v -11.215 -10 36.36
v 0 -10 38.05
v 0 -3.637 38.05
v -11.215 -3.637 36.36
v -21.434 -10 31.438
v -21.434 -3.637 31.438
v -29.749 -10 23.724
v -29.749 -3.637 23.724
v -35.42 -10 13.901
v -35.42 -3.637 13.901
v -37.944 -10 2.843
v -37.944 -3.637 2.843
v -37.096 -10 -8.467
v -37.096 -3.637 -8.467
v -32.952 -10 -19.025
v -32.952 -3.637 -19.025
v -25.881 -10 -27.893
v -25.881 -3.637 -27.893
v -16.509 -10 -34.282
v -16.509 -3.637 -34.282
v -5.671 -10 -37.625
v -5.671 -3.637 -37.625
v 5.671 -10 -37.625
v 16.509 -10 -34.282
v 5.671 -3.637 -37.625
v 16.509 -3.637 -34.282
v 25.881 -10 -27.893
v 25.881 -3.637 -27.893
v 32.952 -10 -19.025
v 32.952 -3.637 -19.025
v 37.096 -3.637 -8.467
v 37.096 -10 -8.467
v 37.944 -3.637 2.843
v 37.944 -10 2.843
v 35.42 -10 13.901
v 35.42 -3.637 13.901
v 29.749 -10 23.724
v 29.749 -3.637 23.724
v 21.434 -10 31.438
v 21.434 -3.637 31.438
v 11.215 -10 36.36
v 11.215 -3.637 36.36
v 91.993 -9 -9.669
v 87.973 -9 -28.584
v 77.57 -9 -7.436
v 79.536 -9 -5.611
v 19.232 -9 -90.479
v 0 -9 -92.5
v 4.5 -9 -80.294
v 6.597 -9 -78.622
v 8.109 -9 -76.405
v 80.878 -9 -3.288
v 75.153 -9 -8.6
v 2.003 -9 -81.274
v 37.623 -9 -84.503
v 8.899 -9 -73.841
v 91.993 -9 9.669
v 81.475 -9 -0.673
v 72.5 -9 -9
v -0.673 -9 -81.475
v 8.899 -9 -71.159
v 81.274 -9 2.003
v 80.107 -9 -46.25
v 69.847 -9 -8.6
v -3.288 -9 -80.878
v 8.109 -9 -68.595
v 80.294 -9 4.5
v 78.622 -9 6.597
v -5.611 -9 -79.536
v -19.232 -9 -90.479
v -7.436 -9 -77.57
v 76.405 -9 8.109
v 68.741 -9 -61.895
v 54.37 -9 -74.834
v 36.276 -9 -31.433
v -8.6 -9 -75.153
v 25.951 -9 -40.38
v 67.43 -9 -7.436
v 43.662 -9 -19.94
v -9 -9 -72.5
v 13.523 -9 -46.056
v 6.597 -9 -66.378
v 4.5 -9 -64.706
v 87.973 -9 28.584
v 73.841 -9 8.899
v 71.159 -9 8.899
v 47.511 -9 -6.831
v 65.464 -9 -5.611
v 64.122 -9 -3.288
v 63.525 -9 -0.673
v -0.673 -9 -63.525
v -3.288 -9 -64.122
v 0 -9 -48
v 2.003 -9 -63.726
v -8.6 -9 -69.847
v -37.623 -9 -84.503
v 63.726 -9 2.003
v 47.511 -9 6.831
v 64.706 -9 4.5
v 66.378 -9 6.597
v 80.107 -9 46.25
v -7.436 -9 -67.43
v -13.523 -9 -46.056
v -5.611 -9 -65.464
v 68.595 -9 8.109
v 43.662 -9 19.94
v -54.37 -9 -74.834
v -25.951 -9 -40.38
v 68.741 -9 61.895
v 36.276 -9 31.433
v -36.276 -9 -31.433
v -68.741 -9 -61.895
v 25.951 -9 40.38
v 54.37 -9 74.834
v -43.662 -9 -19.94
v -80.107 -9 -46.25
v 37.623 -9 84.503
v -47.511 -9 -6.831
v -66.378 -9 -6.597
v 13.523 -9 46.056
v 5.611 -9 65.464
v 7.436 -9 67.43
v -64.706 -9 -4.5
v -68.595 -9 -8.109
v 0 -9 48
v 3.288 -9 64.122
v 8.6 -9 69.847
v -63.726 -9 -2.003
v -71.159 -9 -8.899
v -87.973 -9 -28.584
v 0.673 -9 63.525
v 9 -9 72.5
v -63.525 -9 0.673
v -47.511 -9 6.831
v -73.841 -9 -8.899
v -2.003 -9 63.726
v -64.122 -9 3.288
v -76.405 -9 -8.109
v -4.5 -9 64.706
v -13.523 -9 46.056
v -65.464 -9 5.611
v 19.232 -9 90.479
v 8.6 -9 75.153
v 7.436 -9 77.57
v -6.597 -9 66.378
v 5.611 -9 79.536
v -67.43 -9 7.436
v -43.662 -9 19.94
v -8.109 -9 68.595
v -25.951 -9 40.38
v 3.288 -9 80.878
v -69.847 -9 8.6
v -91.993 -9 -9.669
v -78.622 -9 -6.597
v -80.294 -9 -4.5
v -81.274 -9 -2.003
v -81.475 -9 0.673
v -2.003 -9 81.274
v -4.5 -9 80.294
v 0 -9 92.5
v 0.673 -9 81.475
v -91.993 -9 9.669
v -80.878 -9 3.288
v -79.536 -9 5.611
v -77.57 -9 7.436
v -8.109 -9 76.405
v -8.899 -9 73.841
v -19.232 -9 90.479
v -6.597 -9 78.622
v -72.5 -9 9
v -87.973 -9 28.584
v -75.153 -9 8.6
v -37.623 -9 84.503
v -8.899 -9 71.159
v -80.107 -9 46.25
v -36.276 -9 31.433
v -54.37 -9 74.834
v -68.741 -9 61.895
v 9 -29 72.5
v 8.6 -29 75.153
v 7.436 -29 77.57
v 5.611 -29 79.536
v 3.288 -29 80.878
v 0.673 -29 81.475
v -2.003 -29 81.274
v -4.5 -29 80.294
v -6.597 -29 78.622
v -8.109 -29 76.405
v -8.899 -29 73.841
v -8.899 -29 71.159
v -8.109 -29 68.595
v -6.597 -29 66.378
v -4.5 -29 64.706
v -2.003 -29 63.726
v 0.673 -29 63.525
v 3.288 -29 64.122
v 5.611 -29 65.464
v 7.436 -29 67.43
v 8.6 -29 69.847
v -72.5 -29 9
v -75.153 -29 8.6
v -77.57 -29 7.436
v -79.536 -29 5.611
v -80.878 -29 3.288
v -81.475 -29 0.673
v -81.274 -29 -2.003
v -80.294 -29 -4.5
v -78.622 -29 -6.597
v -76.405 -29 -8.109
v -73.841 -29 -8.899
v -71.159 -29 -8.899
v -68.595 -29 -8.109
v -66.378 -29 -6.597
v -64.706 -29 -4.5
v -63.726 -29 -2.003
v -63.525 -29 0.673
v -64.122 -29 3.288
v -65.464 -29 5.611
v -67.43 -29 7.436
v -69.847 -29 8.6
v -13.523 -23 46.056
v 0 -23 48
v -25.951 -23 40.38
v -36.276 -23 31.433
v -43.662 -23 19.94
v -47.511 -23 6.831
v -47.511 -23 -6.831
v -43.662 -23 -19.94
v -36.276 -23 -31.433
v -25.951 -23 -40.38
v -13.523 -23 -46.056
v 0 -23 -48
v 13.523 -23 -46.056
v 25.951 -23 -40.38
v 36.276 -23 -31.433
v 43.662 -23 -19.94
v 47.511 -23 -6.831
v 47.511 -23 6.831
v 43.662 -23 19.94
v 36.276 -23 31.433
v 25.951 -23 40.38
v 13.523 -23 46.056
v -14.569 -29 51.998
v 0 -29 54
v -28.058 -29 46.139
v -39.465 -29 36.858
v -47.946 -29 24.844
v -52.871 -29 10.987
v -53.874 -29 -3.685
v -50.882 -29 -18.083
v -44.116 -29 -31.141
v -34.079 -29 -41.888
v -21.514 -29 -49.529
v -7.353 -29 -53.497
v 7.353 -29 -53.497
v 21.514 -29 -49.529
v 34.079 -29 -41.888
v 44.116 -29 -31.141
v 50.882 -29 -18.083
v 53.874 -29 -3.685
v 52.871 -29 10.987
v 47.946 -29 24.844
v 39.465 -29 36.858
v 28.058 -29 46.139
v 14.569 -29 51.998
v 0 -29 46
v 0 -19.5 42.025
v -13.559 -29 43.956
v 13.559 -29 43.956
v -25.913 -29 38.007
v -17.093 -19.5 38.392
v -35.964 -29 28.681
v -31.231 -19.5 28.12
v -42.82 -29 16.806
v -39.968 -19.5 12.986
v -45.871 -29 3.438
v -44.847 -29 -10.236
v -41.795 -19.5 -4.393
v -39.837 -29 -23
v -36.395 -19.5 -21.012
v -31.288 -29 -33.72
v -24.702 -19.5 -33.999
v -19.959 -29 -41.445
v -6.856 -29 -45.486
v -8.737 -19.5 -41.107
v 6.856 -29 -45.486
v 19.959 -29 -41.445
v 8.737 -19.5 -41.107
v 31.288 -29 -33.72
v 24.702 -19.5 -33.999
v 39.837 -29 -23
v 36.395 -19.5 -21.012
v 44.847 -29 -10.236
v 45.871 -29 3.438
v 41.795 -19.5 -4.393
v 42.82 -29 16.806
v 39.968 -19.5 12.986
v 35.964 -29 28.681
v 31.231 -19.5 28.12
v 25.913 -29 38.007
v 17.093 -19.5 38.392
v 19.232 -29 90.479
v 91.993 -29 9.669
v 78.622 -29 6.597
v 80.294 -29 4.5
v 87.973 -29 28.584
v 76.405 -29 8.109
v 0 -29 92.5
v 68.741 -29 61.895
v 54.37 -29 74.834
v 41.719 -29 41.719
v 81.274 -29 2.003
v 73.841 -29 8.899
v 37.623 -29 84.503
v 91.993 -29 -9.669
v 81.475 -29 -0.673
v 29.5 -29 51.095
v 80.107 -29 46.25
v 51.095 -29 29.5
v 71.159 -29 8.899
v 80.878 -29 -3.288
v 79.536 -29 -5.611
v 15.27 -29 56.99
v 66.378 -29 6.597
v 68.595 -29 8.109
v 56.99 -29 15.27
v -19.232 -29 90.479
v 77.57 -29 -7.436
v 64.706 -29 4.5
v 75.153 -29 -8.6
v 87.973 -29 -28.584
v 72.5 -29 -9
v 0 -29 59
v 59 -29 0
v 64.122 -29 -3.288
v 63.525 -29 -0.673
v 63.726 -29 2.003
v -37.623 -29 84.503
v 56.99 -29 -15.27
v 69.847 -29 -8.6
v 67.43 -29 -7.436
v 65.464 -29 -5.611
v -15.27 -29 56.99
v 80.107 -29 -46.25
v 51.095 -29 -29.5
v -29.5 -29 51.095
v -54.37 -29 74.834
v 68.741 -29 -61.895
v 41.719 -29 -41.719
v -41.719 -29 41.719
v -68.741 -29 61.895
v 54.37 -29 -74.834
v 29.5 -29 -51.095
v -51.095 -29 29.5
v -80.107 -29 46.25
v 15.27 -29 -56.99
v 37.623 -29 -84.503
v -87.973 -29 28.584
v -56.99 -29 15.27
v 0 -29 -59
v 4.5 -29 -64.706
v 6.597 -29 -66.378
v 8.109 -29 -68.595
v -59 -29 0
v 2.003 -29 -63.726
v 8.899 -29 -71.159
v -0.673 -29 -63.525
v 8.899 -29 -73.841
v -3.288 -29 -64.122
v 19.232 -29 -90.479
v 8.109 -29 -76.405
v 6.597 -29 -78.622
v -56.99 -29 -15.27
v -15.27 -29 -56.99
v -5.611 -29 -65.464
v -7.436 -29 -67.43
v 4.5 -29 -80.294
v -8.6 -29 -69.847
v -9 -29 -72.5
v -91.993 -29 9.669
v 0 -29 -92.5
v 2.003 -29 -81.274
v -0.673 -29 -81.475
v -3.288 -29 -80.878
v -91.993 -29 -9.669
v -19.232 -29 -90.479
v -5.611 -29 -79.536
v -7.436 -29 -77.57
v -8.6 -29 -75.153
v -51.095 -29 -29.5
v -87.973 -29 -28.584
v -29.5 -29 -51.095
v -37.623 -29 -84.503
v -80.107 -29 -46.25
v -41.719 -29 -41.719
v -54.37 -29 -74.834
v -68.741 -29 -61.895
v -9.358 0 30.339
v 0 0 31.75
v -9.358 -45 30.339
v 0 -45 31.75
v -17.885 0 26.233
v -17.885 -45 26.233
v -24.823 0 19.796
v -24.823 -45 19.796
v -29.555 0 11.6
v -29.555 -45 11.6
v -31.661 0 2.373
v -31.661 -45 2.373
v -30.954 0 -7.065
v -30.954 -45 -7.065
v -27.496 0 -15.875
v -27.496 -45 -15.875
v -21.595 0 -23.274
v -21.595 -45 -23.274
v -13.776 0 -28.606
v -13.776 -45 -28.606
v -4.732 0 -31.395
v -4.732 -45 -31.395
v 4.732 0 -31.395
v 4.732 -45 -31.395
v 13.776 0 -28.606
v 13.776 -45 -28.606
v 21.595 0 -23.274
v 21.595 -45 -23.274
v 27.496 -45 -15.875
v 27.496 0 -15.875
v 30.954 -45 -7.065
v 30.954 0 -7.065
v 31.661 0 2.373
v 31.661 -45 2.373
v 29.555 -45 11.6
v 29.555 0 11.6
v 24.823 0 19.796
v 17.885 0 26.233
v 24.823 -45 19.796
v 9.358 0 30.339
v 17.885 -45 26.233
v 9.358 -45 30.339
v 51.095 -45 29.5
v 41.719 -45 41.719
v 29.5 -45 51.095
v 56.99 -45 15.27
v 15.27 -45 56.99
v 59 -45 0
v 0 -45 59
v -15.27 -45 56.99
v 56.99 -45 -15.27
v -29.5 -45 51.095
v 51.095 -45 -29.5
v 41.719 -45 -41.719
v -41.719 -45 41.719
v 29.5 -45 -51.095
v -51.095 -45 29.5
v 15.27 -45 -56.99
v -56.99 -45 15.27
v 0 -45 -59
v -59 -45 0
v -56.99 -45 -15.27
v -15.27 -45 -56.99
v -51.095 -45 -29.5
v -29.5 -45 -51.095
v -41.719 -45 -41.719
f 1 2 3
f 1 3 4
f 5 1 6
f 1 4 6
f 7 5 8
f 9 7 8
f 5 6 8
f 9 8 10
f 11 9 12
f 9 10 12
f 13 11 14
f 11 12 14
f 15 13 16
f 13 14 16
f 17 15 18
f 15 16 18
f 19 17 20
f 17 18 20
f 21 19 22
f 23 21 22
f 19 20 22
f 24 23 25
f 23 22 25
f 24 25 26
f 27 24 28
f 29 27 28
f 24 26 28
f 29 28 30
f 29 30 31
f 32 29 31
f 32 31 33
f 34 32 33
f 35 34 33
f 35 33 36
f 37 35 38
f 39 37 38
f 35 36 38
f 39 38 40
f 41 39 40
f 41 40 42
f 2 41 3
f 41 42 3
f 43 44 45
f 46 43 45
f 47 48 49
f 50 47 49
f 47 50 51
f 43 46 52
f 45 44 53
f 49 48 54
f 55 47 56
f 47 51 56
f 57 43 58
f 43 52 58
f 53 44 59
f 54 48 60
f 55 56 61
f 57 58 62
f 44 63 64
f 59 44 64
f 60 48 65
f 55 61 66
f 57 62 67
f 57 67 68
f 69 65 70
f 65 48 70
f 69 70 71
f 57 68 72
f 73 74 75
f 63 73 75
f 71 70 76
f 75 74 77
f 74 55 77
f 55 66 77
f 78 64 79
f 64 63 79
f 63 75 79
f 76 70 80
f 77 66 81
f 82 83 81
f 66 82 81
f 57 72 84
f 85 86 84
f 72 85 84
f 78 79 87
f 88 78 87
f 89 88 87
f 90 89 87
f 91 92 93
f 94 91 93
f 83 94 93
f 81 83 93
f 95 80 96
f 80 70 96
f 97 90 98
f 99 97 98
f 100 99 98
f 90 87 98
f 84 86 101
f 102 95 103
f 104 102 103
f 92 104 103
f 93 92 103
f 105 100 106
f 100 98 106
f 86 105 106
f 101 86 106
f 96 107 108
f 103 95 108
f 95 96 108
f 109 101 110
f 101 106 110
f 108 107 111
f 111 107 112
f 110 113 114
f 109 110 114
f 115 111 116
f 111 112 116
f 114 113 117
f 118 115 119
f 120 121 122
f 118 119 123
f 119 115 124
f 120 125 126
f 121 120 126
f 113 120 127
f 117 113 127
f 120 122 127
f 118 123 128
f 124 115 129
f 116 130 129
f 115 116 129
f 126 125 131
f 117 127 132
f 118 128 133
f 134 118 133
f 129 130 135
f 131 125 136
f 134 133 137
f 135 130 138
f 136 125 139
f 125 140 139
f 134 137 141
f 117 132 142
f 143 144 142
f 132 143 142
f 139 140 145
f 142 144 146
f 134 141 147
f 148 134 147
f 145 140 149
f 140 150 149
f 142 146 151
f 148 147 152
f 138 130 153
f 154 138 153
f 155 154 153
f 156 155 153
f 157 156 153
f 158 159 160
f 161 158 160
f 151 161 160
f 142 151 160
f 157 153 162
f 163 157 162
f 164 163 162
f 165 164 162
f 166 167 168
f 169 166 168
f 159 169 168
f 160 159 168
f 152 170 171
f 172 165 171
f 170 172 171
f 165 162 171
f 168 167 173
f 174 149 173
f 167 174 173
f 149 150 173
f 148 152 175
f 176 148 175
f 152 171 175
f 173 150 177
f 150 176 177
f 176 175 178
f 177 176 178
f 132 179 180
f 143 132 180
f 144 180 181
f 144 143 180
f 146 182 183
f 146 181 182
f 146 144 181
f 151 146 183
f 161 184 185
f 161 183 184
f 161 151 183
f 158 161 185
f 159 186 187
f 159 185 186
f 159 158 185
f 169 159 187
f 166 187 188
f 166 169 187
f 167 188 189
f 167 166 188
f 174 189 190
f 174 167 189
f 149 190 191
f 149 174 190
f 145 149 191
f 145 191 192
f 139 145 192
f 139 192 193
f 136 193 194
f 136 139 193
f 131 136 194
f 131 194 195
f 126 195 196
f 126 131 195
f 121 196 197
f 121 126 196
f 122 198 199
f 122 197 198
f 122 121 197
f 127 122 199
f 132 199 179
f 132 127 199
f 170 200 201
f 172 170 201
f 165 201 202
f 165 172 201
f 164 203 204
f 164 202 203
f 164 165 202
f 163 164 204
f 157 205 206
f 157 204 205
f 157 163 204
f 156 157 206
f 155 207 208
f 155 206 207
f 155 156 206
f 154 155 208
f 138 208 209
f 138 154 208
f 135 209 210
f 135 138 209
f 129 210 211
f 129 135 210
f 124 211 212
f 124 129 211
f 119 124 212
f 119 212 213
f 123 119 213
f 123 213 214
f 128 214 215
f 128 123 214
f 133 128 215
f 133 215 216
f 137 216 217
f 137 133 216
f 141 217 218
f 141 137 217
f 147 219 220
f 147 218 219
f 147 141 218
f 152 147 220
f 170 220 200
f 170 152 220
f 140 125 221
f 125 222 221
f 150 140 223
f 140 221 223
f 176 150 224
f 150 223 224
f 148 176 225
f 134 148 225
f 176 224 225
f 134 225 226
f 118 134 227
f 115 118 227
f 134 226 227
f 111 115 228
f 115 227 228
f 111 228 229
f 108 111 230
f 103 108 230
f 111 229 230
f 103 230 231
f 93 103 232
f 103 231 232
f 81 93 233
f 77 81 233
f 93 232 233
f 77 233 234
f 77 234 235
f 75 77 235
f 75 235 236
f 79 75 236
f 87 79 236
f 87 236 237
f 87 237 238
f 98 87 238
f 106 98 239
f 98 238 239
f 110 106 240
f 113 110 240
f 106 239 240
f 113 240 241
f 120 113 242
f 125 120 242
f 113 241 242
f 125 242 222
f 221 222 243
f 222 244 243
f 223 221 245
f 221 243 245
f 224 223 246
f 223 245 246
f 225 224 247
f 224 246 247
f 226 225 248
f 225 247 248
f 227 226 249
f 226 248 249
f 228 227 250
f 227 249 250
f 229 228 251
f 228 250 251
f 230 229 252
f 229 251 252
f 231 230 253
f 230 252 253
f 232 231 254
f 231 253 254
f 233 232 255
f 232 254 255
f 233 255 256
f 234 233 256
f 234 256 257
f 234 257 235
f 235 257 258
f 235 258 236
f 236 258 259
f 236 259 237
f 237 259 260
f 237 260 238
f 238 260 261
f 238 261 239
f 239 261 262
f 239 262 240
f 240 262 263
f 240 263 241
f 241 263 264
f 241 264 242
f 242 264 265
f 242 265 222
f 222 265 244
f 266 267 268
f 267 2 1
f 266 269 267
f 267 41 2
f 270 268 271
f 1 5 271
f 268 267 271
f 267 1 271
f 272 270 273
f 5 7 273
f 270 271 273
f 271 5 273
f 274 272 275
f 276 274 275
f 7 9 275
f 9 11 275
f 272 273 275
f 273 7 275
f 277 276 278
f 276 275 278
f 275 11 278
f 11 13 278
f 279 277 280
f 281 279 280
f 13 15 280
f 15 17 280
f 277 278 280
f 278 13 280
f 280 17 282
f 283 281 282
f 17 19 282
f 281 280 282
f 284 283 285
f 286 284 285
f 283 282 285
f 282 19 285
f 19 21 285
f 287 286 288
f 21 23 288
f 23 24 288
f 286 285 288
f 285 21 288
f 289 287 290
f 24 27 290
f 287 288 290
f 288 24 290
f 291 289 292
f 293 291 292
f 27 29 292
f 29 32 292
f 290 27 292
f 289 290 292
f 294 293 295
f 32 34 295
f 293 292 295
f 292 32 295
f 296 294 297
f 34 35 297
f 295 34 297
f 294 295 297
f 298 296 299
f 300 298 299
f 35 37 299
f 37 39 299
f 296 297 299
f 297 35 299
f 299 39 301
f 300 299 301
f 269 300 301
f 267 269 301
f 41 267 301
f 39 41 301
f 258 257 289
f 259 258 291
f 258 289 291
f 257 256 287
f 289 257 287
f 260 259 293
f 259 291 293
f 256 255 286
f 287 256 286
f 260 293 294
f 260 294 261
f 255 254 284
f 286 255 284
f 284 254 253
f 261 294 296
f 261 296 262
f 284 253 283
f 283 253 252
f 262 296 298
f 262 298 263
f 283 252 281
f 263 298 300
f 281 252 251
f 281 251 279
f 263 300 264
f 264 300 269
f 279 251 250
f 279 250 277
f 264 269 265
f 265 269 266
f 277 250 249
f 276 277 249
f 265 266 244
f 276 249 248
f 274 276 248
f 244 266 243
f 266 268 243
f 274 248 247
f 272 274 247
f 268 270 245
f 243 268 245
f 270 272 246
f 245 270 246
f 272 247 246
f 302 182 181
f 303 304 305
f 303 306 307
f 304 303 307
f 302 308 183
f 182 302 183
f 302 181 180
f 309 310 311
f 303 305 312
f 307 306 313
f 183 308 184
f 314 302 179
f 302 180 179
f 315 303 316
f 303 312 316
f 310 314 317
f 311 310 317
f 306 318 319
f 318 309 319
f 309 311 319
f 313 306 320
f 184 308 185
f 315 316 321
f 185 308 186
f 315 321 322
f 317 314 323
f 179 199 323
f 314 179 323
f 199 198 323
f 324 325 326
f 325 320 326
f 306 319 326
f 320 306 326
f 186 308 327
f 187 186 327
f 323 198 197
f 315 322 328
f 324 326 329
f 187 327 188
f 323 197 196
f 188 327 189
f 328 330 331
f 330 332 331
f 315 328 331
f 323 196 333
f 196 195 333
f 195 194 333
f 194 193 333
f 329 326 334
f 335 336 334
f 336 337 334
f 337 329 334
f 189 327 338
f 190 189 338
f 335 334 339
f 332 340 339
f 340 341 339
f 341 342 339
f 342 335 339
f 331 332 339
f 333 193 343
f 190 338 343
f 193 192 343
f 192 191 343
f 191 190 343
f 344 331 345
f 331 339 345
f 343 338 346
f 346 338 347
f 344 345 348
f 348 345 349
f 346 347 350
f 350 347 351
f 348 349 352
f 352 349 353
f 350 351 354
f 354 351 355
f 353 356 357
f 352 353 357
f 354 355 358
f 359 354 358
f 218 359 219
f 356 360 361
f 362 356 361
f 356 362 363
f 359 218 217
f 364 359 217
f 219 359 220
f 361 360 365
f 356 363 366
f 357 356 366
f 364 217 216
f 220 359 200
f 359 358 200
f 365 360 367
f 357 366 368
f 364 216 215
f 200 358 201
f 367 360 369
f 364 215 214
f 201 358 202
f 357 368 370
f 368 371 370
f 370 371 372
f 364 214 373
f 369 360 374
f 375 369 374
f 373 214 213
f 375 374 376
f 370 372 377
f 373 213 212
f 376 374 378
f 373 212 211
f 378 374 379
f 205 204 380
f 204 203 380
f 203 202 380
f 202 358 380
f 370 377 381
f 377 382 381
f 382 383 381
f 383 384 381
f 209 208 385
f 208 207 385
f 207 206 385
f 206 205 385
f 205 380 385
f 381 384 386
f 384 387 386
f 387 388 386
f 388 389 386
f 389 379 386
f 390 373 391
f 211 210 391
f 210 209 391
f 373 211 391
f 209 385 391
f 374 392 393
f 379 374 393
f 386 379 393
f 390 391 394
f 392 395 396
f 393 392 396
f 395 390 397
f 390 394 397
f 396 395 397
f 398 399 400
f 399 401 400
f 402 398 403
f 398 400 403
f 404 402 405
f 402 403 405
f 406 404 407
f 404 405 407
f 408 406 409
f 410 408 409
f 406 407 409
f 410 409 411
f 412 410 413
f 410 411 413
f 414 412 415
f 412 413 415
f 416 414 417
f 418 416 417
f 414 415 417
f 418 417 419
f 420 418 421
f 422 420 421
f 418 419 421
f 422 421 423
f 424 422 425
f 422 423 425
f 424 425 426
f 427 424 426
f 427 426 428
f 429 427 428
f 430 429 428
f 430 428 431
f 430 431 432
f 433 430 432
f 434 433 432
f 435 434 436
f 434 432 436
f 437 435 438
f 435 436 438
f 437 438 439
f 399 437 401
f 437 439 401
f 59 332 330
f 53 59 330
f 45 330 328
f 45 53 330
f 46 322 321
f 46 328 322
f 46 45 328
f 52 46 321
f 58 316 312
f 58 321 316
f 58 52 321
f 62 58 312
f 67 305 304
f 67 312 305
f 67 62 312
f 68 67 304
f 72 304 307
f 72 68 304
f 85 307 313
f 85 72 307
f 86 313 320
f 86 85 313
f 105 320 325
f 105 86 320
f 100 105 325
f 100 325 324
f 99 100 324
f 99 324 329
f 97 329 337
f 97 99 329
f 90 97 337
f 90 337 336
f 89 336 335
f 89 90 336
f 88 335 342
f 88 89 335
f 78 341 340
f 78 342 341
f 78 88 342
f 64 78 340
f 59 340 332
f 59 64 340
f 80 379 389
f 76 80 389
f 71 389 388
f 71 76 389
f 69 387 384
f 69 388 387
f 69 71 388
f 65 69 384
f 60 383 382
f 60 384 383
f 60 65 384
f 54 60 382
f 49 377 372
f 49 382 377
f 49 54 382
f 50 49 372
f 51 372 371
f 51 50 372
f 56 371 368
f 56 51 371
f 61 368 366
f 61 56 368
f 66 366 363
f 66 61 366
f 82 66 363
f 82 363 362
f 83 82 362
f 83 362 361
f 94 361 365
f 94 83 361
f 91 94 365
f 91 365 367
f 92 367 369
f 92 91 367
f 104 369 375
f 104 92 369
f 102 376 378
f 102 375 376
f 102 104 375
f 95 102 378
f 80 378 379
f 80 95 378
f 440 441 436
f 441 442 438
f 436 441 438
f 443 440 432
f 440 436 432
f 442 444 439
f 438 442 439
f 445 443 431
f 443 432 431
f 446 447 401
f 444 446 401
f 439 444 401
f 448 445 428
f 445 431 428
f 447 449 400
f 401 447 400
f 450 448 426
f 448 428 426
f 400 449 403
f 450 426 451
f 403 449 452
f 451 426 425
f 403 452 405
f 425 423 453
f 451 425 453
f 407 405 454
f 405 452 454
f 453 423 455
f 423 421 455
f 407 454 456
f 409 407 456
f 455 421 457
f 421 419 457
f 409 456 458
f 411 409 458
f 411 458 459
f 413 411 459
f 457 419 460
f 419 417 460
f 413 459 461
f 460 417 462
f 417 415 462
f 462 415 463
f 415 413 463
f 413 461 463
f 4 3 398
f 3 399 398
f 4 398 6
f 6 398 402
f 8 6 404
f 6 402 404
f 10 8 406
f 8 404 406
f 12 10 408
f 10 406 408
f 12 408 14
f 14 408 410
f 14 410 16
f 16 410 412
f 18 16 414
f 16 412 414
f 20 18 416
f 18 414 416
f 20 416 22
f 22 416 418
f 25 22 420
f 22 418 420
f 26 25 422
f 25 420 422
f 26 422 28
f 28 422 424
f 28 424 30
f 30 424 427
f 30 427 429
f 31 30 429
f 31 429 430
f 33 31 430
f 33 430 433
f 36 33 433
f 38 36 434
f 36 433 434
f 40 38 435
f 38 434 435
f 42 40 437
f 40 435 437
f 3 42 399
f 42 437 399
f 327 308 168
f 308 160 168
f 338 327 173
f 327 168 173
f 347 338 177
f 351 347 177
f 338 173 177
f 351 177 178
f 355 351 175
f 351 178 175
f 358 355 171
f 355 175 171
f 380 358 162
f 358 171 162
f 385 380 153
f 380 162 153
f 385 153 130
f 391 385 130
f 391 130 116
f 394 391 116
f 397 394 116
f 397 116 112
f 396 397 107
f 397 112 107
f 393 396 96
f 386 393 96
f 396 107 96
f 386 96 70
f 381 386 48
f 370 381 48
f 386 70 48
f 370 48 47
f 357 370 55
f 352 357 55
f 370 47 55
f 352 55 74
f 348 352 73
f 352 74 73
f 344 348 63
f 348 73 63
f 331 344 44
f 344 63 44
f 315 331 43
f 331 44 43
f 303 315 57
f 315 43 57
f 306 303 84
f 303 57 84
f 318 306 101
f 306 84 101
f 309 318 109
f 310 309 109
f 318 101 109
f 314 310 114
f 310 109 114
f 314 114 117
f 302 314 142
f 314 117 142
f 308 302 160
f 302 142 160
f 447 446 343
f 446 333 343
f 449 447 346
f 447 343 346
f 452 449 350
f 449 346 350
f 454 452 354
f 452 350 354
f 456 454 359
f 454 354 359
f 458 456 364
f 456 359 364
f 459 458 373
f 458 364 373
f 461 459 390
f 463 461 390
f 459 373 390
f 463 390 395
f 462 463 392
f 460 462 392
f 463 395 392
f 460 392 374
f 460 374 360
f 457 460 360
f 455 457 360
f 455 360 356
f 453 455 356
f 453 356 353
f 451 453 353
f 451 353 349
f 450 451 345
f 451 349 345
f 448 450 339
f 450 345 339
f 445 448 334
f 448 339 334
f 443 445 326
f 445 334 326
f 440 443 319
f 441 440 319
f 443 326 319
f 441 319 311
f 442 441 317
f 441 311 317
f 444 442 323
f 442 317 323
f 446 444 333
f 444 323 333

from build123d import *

# Parameters (mm, degrees)
CUTSKETCH_W             = 9
CUTSKETCH_H             = 22
BOLTCIRCLEPATTERN_COUNT = 4


with BuildPart() as part:
    # BaseSketch → BaseRevolve (revolve)
    with BuildSketch(Plane.XY):
        Polygon((-31.75, 0), (-31.75, -45), (-59, -45), (-59, -29), (-92.5, -29), (-92.5, -9), (-48, -9), (-48, -23), (-54, -29), (-46, -29), (-38.05, -10), (-38.05, -3.637306696), align=None)
    revolve(axis=Axis((0, 0, 0), (0, -1, 0)))

    # CutSketch → CenterRevCut (revolve, cut)
    with BuildSketch(Plane.XY):
        with Locations((-77, -19)):
            Rectangle(CUTSKETCH_W, CUTSKETCH_H)
    centerrevcut = revolve(axis=Axis((-72.5, 10.805368121, 0), (0, -1, 0)), mode=Mode.SUBTRACT)

    # BoltCirclePattern: CenterRevCut ×4 about axis
    boltcirclepattern_axis = Axis((0, 0, 0), (0, -1, 0))
    for i in range(1, BOLTCIRCLEPATTERN_COUNT):
        add(centerrevcut.rotate(boltcirclepattern_axis, i * 360 / BOLTCIRCLEPATTERN_COUNT), mode=Mode.SUBTRACT)


solid = part.part
